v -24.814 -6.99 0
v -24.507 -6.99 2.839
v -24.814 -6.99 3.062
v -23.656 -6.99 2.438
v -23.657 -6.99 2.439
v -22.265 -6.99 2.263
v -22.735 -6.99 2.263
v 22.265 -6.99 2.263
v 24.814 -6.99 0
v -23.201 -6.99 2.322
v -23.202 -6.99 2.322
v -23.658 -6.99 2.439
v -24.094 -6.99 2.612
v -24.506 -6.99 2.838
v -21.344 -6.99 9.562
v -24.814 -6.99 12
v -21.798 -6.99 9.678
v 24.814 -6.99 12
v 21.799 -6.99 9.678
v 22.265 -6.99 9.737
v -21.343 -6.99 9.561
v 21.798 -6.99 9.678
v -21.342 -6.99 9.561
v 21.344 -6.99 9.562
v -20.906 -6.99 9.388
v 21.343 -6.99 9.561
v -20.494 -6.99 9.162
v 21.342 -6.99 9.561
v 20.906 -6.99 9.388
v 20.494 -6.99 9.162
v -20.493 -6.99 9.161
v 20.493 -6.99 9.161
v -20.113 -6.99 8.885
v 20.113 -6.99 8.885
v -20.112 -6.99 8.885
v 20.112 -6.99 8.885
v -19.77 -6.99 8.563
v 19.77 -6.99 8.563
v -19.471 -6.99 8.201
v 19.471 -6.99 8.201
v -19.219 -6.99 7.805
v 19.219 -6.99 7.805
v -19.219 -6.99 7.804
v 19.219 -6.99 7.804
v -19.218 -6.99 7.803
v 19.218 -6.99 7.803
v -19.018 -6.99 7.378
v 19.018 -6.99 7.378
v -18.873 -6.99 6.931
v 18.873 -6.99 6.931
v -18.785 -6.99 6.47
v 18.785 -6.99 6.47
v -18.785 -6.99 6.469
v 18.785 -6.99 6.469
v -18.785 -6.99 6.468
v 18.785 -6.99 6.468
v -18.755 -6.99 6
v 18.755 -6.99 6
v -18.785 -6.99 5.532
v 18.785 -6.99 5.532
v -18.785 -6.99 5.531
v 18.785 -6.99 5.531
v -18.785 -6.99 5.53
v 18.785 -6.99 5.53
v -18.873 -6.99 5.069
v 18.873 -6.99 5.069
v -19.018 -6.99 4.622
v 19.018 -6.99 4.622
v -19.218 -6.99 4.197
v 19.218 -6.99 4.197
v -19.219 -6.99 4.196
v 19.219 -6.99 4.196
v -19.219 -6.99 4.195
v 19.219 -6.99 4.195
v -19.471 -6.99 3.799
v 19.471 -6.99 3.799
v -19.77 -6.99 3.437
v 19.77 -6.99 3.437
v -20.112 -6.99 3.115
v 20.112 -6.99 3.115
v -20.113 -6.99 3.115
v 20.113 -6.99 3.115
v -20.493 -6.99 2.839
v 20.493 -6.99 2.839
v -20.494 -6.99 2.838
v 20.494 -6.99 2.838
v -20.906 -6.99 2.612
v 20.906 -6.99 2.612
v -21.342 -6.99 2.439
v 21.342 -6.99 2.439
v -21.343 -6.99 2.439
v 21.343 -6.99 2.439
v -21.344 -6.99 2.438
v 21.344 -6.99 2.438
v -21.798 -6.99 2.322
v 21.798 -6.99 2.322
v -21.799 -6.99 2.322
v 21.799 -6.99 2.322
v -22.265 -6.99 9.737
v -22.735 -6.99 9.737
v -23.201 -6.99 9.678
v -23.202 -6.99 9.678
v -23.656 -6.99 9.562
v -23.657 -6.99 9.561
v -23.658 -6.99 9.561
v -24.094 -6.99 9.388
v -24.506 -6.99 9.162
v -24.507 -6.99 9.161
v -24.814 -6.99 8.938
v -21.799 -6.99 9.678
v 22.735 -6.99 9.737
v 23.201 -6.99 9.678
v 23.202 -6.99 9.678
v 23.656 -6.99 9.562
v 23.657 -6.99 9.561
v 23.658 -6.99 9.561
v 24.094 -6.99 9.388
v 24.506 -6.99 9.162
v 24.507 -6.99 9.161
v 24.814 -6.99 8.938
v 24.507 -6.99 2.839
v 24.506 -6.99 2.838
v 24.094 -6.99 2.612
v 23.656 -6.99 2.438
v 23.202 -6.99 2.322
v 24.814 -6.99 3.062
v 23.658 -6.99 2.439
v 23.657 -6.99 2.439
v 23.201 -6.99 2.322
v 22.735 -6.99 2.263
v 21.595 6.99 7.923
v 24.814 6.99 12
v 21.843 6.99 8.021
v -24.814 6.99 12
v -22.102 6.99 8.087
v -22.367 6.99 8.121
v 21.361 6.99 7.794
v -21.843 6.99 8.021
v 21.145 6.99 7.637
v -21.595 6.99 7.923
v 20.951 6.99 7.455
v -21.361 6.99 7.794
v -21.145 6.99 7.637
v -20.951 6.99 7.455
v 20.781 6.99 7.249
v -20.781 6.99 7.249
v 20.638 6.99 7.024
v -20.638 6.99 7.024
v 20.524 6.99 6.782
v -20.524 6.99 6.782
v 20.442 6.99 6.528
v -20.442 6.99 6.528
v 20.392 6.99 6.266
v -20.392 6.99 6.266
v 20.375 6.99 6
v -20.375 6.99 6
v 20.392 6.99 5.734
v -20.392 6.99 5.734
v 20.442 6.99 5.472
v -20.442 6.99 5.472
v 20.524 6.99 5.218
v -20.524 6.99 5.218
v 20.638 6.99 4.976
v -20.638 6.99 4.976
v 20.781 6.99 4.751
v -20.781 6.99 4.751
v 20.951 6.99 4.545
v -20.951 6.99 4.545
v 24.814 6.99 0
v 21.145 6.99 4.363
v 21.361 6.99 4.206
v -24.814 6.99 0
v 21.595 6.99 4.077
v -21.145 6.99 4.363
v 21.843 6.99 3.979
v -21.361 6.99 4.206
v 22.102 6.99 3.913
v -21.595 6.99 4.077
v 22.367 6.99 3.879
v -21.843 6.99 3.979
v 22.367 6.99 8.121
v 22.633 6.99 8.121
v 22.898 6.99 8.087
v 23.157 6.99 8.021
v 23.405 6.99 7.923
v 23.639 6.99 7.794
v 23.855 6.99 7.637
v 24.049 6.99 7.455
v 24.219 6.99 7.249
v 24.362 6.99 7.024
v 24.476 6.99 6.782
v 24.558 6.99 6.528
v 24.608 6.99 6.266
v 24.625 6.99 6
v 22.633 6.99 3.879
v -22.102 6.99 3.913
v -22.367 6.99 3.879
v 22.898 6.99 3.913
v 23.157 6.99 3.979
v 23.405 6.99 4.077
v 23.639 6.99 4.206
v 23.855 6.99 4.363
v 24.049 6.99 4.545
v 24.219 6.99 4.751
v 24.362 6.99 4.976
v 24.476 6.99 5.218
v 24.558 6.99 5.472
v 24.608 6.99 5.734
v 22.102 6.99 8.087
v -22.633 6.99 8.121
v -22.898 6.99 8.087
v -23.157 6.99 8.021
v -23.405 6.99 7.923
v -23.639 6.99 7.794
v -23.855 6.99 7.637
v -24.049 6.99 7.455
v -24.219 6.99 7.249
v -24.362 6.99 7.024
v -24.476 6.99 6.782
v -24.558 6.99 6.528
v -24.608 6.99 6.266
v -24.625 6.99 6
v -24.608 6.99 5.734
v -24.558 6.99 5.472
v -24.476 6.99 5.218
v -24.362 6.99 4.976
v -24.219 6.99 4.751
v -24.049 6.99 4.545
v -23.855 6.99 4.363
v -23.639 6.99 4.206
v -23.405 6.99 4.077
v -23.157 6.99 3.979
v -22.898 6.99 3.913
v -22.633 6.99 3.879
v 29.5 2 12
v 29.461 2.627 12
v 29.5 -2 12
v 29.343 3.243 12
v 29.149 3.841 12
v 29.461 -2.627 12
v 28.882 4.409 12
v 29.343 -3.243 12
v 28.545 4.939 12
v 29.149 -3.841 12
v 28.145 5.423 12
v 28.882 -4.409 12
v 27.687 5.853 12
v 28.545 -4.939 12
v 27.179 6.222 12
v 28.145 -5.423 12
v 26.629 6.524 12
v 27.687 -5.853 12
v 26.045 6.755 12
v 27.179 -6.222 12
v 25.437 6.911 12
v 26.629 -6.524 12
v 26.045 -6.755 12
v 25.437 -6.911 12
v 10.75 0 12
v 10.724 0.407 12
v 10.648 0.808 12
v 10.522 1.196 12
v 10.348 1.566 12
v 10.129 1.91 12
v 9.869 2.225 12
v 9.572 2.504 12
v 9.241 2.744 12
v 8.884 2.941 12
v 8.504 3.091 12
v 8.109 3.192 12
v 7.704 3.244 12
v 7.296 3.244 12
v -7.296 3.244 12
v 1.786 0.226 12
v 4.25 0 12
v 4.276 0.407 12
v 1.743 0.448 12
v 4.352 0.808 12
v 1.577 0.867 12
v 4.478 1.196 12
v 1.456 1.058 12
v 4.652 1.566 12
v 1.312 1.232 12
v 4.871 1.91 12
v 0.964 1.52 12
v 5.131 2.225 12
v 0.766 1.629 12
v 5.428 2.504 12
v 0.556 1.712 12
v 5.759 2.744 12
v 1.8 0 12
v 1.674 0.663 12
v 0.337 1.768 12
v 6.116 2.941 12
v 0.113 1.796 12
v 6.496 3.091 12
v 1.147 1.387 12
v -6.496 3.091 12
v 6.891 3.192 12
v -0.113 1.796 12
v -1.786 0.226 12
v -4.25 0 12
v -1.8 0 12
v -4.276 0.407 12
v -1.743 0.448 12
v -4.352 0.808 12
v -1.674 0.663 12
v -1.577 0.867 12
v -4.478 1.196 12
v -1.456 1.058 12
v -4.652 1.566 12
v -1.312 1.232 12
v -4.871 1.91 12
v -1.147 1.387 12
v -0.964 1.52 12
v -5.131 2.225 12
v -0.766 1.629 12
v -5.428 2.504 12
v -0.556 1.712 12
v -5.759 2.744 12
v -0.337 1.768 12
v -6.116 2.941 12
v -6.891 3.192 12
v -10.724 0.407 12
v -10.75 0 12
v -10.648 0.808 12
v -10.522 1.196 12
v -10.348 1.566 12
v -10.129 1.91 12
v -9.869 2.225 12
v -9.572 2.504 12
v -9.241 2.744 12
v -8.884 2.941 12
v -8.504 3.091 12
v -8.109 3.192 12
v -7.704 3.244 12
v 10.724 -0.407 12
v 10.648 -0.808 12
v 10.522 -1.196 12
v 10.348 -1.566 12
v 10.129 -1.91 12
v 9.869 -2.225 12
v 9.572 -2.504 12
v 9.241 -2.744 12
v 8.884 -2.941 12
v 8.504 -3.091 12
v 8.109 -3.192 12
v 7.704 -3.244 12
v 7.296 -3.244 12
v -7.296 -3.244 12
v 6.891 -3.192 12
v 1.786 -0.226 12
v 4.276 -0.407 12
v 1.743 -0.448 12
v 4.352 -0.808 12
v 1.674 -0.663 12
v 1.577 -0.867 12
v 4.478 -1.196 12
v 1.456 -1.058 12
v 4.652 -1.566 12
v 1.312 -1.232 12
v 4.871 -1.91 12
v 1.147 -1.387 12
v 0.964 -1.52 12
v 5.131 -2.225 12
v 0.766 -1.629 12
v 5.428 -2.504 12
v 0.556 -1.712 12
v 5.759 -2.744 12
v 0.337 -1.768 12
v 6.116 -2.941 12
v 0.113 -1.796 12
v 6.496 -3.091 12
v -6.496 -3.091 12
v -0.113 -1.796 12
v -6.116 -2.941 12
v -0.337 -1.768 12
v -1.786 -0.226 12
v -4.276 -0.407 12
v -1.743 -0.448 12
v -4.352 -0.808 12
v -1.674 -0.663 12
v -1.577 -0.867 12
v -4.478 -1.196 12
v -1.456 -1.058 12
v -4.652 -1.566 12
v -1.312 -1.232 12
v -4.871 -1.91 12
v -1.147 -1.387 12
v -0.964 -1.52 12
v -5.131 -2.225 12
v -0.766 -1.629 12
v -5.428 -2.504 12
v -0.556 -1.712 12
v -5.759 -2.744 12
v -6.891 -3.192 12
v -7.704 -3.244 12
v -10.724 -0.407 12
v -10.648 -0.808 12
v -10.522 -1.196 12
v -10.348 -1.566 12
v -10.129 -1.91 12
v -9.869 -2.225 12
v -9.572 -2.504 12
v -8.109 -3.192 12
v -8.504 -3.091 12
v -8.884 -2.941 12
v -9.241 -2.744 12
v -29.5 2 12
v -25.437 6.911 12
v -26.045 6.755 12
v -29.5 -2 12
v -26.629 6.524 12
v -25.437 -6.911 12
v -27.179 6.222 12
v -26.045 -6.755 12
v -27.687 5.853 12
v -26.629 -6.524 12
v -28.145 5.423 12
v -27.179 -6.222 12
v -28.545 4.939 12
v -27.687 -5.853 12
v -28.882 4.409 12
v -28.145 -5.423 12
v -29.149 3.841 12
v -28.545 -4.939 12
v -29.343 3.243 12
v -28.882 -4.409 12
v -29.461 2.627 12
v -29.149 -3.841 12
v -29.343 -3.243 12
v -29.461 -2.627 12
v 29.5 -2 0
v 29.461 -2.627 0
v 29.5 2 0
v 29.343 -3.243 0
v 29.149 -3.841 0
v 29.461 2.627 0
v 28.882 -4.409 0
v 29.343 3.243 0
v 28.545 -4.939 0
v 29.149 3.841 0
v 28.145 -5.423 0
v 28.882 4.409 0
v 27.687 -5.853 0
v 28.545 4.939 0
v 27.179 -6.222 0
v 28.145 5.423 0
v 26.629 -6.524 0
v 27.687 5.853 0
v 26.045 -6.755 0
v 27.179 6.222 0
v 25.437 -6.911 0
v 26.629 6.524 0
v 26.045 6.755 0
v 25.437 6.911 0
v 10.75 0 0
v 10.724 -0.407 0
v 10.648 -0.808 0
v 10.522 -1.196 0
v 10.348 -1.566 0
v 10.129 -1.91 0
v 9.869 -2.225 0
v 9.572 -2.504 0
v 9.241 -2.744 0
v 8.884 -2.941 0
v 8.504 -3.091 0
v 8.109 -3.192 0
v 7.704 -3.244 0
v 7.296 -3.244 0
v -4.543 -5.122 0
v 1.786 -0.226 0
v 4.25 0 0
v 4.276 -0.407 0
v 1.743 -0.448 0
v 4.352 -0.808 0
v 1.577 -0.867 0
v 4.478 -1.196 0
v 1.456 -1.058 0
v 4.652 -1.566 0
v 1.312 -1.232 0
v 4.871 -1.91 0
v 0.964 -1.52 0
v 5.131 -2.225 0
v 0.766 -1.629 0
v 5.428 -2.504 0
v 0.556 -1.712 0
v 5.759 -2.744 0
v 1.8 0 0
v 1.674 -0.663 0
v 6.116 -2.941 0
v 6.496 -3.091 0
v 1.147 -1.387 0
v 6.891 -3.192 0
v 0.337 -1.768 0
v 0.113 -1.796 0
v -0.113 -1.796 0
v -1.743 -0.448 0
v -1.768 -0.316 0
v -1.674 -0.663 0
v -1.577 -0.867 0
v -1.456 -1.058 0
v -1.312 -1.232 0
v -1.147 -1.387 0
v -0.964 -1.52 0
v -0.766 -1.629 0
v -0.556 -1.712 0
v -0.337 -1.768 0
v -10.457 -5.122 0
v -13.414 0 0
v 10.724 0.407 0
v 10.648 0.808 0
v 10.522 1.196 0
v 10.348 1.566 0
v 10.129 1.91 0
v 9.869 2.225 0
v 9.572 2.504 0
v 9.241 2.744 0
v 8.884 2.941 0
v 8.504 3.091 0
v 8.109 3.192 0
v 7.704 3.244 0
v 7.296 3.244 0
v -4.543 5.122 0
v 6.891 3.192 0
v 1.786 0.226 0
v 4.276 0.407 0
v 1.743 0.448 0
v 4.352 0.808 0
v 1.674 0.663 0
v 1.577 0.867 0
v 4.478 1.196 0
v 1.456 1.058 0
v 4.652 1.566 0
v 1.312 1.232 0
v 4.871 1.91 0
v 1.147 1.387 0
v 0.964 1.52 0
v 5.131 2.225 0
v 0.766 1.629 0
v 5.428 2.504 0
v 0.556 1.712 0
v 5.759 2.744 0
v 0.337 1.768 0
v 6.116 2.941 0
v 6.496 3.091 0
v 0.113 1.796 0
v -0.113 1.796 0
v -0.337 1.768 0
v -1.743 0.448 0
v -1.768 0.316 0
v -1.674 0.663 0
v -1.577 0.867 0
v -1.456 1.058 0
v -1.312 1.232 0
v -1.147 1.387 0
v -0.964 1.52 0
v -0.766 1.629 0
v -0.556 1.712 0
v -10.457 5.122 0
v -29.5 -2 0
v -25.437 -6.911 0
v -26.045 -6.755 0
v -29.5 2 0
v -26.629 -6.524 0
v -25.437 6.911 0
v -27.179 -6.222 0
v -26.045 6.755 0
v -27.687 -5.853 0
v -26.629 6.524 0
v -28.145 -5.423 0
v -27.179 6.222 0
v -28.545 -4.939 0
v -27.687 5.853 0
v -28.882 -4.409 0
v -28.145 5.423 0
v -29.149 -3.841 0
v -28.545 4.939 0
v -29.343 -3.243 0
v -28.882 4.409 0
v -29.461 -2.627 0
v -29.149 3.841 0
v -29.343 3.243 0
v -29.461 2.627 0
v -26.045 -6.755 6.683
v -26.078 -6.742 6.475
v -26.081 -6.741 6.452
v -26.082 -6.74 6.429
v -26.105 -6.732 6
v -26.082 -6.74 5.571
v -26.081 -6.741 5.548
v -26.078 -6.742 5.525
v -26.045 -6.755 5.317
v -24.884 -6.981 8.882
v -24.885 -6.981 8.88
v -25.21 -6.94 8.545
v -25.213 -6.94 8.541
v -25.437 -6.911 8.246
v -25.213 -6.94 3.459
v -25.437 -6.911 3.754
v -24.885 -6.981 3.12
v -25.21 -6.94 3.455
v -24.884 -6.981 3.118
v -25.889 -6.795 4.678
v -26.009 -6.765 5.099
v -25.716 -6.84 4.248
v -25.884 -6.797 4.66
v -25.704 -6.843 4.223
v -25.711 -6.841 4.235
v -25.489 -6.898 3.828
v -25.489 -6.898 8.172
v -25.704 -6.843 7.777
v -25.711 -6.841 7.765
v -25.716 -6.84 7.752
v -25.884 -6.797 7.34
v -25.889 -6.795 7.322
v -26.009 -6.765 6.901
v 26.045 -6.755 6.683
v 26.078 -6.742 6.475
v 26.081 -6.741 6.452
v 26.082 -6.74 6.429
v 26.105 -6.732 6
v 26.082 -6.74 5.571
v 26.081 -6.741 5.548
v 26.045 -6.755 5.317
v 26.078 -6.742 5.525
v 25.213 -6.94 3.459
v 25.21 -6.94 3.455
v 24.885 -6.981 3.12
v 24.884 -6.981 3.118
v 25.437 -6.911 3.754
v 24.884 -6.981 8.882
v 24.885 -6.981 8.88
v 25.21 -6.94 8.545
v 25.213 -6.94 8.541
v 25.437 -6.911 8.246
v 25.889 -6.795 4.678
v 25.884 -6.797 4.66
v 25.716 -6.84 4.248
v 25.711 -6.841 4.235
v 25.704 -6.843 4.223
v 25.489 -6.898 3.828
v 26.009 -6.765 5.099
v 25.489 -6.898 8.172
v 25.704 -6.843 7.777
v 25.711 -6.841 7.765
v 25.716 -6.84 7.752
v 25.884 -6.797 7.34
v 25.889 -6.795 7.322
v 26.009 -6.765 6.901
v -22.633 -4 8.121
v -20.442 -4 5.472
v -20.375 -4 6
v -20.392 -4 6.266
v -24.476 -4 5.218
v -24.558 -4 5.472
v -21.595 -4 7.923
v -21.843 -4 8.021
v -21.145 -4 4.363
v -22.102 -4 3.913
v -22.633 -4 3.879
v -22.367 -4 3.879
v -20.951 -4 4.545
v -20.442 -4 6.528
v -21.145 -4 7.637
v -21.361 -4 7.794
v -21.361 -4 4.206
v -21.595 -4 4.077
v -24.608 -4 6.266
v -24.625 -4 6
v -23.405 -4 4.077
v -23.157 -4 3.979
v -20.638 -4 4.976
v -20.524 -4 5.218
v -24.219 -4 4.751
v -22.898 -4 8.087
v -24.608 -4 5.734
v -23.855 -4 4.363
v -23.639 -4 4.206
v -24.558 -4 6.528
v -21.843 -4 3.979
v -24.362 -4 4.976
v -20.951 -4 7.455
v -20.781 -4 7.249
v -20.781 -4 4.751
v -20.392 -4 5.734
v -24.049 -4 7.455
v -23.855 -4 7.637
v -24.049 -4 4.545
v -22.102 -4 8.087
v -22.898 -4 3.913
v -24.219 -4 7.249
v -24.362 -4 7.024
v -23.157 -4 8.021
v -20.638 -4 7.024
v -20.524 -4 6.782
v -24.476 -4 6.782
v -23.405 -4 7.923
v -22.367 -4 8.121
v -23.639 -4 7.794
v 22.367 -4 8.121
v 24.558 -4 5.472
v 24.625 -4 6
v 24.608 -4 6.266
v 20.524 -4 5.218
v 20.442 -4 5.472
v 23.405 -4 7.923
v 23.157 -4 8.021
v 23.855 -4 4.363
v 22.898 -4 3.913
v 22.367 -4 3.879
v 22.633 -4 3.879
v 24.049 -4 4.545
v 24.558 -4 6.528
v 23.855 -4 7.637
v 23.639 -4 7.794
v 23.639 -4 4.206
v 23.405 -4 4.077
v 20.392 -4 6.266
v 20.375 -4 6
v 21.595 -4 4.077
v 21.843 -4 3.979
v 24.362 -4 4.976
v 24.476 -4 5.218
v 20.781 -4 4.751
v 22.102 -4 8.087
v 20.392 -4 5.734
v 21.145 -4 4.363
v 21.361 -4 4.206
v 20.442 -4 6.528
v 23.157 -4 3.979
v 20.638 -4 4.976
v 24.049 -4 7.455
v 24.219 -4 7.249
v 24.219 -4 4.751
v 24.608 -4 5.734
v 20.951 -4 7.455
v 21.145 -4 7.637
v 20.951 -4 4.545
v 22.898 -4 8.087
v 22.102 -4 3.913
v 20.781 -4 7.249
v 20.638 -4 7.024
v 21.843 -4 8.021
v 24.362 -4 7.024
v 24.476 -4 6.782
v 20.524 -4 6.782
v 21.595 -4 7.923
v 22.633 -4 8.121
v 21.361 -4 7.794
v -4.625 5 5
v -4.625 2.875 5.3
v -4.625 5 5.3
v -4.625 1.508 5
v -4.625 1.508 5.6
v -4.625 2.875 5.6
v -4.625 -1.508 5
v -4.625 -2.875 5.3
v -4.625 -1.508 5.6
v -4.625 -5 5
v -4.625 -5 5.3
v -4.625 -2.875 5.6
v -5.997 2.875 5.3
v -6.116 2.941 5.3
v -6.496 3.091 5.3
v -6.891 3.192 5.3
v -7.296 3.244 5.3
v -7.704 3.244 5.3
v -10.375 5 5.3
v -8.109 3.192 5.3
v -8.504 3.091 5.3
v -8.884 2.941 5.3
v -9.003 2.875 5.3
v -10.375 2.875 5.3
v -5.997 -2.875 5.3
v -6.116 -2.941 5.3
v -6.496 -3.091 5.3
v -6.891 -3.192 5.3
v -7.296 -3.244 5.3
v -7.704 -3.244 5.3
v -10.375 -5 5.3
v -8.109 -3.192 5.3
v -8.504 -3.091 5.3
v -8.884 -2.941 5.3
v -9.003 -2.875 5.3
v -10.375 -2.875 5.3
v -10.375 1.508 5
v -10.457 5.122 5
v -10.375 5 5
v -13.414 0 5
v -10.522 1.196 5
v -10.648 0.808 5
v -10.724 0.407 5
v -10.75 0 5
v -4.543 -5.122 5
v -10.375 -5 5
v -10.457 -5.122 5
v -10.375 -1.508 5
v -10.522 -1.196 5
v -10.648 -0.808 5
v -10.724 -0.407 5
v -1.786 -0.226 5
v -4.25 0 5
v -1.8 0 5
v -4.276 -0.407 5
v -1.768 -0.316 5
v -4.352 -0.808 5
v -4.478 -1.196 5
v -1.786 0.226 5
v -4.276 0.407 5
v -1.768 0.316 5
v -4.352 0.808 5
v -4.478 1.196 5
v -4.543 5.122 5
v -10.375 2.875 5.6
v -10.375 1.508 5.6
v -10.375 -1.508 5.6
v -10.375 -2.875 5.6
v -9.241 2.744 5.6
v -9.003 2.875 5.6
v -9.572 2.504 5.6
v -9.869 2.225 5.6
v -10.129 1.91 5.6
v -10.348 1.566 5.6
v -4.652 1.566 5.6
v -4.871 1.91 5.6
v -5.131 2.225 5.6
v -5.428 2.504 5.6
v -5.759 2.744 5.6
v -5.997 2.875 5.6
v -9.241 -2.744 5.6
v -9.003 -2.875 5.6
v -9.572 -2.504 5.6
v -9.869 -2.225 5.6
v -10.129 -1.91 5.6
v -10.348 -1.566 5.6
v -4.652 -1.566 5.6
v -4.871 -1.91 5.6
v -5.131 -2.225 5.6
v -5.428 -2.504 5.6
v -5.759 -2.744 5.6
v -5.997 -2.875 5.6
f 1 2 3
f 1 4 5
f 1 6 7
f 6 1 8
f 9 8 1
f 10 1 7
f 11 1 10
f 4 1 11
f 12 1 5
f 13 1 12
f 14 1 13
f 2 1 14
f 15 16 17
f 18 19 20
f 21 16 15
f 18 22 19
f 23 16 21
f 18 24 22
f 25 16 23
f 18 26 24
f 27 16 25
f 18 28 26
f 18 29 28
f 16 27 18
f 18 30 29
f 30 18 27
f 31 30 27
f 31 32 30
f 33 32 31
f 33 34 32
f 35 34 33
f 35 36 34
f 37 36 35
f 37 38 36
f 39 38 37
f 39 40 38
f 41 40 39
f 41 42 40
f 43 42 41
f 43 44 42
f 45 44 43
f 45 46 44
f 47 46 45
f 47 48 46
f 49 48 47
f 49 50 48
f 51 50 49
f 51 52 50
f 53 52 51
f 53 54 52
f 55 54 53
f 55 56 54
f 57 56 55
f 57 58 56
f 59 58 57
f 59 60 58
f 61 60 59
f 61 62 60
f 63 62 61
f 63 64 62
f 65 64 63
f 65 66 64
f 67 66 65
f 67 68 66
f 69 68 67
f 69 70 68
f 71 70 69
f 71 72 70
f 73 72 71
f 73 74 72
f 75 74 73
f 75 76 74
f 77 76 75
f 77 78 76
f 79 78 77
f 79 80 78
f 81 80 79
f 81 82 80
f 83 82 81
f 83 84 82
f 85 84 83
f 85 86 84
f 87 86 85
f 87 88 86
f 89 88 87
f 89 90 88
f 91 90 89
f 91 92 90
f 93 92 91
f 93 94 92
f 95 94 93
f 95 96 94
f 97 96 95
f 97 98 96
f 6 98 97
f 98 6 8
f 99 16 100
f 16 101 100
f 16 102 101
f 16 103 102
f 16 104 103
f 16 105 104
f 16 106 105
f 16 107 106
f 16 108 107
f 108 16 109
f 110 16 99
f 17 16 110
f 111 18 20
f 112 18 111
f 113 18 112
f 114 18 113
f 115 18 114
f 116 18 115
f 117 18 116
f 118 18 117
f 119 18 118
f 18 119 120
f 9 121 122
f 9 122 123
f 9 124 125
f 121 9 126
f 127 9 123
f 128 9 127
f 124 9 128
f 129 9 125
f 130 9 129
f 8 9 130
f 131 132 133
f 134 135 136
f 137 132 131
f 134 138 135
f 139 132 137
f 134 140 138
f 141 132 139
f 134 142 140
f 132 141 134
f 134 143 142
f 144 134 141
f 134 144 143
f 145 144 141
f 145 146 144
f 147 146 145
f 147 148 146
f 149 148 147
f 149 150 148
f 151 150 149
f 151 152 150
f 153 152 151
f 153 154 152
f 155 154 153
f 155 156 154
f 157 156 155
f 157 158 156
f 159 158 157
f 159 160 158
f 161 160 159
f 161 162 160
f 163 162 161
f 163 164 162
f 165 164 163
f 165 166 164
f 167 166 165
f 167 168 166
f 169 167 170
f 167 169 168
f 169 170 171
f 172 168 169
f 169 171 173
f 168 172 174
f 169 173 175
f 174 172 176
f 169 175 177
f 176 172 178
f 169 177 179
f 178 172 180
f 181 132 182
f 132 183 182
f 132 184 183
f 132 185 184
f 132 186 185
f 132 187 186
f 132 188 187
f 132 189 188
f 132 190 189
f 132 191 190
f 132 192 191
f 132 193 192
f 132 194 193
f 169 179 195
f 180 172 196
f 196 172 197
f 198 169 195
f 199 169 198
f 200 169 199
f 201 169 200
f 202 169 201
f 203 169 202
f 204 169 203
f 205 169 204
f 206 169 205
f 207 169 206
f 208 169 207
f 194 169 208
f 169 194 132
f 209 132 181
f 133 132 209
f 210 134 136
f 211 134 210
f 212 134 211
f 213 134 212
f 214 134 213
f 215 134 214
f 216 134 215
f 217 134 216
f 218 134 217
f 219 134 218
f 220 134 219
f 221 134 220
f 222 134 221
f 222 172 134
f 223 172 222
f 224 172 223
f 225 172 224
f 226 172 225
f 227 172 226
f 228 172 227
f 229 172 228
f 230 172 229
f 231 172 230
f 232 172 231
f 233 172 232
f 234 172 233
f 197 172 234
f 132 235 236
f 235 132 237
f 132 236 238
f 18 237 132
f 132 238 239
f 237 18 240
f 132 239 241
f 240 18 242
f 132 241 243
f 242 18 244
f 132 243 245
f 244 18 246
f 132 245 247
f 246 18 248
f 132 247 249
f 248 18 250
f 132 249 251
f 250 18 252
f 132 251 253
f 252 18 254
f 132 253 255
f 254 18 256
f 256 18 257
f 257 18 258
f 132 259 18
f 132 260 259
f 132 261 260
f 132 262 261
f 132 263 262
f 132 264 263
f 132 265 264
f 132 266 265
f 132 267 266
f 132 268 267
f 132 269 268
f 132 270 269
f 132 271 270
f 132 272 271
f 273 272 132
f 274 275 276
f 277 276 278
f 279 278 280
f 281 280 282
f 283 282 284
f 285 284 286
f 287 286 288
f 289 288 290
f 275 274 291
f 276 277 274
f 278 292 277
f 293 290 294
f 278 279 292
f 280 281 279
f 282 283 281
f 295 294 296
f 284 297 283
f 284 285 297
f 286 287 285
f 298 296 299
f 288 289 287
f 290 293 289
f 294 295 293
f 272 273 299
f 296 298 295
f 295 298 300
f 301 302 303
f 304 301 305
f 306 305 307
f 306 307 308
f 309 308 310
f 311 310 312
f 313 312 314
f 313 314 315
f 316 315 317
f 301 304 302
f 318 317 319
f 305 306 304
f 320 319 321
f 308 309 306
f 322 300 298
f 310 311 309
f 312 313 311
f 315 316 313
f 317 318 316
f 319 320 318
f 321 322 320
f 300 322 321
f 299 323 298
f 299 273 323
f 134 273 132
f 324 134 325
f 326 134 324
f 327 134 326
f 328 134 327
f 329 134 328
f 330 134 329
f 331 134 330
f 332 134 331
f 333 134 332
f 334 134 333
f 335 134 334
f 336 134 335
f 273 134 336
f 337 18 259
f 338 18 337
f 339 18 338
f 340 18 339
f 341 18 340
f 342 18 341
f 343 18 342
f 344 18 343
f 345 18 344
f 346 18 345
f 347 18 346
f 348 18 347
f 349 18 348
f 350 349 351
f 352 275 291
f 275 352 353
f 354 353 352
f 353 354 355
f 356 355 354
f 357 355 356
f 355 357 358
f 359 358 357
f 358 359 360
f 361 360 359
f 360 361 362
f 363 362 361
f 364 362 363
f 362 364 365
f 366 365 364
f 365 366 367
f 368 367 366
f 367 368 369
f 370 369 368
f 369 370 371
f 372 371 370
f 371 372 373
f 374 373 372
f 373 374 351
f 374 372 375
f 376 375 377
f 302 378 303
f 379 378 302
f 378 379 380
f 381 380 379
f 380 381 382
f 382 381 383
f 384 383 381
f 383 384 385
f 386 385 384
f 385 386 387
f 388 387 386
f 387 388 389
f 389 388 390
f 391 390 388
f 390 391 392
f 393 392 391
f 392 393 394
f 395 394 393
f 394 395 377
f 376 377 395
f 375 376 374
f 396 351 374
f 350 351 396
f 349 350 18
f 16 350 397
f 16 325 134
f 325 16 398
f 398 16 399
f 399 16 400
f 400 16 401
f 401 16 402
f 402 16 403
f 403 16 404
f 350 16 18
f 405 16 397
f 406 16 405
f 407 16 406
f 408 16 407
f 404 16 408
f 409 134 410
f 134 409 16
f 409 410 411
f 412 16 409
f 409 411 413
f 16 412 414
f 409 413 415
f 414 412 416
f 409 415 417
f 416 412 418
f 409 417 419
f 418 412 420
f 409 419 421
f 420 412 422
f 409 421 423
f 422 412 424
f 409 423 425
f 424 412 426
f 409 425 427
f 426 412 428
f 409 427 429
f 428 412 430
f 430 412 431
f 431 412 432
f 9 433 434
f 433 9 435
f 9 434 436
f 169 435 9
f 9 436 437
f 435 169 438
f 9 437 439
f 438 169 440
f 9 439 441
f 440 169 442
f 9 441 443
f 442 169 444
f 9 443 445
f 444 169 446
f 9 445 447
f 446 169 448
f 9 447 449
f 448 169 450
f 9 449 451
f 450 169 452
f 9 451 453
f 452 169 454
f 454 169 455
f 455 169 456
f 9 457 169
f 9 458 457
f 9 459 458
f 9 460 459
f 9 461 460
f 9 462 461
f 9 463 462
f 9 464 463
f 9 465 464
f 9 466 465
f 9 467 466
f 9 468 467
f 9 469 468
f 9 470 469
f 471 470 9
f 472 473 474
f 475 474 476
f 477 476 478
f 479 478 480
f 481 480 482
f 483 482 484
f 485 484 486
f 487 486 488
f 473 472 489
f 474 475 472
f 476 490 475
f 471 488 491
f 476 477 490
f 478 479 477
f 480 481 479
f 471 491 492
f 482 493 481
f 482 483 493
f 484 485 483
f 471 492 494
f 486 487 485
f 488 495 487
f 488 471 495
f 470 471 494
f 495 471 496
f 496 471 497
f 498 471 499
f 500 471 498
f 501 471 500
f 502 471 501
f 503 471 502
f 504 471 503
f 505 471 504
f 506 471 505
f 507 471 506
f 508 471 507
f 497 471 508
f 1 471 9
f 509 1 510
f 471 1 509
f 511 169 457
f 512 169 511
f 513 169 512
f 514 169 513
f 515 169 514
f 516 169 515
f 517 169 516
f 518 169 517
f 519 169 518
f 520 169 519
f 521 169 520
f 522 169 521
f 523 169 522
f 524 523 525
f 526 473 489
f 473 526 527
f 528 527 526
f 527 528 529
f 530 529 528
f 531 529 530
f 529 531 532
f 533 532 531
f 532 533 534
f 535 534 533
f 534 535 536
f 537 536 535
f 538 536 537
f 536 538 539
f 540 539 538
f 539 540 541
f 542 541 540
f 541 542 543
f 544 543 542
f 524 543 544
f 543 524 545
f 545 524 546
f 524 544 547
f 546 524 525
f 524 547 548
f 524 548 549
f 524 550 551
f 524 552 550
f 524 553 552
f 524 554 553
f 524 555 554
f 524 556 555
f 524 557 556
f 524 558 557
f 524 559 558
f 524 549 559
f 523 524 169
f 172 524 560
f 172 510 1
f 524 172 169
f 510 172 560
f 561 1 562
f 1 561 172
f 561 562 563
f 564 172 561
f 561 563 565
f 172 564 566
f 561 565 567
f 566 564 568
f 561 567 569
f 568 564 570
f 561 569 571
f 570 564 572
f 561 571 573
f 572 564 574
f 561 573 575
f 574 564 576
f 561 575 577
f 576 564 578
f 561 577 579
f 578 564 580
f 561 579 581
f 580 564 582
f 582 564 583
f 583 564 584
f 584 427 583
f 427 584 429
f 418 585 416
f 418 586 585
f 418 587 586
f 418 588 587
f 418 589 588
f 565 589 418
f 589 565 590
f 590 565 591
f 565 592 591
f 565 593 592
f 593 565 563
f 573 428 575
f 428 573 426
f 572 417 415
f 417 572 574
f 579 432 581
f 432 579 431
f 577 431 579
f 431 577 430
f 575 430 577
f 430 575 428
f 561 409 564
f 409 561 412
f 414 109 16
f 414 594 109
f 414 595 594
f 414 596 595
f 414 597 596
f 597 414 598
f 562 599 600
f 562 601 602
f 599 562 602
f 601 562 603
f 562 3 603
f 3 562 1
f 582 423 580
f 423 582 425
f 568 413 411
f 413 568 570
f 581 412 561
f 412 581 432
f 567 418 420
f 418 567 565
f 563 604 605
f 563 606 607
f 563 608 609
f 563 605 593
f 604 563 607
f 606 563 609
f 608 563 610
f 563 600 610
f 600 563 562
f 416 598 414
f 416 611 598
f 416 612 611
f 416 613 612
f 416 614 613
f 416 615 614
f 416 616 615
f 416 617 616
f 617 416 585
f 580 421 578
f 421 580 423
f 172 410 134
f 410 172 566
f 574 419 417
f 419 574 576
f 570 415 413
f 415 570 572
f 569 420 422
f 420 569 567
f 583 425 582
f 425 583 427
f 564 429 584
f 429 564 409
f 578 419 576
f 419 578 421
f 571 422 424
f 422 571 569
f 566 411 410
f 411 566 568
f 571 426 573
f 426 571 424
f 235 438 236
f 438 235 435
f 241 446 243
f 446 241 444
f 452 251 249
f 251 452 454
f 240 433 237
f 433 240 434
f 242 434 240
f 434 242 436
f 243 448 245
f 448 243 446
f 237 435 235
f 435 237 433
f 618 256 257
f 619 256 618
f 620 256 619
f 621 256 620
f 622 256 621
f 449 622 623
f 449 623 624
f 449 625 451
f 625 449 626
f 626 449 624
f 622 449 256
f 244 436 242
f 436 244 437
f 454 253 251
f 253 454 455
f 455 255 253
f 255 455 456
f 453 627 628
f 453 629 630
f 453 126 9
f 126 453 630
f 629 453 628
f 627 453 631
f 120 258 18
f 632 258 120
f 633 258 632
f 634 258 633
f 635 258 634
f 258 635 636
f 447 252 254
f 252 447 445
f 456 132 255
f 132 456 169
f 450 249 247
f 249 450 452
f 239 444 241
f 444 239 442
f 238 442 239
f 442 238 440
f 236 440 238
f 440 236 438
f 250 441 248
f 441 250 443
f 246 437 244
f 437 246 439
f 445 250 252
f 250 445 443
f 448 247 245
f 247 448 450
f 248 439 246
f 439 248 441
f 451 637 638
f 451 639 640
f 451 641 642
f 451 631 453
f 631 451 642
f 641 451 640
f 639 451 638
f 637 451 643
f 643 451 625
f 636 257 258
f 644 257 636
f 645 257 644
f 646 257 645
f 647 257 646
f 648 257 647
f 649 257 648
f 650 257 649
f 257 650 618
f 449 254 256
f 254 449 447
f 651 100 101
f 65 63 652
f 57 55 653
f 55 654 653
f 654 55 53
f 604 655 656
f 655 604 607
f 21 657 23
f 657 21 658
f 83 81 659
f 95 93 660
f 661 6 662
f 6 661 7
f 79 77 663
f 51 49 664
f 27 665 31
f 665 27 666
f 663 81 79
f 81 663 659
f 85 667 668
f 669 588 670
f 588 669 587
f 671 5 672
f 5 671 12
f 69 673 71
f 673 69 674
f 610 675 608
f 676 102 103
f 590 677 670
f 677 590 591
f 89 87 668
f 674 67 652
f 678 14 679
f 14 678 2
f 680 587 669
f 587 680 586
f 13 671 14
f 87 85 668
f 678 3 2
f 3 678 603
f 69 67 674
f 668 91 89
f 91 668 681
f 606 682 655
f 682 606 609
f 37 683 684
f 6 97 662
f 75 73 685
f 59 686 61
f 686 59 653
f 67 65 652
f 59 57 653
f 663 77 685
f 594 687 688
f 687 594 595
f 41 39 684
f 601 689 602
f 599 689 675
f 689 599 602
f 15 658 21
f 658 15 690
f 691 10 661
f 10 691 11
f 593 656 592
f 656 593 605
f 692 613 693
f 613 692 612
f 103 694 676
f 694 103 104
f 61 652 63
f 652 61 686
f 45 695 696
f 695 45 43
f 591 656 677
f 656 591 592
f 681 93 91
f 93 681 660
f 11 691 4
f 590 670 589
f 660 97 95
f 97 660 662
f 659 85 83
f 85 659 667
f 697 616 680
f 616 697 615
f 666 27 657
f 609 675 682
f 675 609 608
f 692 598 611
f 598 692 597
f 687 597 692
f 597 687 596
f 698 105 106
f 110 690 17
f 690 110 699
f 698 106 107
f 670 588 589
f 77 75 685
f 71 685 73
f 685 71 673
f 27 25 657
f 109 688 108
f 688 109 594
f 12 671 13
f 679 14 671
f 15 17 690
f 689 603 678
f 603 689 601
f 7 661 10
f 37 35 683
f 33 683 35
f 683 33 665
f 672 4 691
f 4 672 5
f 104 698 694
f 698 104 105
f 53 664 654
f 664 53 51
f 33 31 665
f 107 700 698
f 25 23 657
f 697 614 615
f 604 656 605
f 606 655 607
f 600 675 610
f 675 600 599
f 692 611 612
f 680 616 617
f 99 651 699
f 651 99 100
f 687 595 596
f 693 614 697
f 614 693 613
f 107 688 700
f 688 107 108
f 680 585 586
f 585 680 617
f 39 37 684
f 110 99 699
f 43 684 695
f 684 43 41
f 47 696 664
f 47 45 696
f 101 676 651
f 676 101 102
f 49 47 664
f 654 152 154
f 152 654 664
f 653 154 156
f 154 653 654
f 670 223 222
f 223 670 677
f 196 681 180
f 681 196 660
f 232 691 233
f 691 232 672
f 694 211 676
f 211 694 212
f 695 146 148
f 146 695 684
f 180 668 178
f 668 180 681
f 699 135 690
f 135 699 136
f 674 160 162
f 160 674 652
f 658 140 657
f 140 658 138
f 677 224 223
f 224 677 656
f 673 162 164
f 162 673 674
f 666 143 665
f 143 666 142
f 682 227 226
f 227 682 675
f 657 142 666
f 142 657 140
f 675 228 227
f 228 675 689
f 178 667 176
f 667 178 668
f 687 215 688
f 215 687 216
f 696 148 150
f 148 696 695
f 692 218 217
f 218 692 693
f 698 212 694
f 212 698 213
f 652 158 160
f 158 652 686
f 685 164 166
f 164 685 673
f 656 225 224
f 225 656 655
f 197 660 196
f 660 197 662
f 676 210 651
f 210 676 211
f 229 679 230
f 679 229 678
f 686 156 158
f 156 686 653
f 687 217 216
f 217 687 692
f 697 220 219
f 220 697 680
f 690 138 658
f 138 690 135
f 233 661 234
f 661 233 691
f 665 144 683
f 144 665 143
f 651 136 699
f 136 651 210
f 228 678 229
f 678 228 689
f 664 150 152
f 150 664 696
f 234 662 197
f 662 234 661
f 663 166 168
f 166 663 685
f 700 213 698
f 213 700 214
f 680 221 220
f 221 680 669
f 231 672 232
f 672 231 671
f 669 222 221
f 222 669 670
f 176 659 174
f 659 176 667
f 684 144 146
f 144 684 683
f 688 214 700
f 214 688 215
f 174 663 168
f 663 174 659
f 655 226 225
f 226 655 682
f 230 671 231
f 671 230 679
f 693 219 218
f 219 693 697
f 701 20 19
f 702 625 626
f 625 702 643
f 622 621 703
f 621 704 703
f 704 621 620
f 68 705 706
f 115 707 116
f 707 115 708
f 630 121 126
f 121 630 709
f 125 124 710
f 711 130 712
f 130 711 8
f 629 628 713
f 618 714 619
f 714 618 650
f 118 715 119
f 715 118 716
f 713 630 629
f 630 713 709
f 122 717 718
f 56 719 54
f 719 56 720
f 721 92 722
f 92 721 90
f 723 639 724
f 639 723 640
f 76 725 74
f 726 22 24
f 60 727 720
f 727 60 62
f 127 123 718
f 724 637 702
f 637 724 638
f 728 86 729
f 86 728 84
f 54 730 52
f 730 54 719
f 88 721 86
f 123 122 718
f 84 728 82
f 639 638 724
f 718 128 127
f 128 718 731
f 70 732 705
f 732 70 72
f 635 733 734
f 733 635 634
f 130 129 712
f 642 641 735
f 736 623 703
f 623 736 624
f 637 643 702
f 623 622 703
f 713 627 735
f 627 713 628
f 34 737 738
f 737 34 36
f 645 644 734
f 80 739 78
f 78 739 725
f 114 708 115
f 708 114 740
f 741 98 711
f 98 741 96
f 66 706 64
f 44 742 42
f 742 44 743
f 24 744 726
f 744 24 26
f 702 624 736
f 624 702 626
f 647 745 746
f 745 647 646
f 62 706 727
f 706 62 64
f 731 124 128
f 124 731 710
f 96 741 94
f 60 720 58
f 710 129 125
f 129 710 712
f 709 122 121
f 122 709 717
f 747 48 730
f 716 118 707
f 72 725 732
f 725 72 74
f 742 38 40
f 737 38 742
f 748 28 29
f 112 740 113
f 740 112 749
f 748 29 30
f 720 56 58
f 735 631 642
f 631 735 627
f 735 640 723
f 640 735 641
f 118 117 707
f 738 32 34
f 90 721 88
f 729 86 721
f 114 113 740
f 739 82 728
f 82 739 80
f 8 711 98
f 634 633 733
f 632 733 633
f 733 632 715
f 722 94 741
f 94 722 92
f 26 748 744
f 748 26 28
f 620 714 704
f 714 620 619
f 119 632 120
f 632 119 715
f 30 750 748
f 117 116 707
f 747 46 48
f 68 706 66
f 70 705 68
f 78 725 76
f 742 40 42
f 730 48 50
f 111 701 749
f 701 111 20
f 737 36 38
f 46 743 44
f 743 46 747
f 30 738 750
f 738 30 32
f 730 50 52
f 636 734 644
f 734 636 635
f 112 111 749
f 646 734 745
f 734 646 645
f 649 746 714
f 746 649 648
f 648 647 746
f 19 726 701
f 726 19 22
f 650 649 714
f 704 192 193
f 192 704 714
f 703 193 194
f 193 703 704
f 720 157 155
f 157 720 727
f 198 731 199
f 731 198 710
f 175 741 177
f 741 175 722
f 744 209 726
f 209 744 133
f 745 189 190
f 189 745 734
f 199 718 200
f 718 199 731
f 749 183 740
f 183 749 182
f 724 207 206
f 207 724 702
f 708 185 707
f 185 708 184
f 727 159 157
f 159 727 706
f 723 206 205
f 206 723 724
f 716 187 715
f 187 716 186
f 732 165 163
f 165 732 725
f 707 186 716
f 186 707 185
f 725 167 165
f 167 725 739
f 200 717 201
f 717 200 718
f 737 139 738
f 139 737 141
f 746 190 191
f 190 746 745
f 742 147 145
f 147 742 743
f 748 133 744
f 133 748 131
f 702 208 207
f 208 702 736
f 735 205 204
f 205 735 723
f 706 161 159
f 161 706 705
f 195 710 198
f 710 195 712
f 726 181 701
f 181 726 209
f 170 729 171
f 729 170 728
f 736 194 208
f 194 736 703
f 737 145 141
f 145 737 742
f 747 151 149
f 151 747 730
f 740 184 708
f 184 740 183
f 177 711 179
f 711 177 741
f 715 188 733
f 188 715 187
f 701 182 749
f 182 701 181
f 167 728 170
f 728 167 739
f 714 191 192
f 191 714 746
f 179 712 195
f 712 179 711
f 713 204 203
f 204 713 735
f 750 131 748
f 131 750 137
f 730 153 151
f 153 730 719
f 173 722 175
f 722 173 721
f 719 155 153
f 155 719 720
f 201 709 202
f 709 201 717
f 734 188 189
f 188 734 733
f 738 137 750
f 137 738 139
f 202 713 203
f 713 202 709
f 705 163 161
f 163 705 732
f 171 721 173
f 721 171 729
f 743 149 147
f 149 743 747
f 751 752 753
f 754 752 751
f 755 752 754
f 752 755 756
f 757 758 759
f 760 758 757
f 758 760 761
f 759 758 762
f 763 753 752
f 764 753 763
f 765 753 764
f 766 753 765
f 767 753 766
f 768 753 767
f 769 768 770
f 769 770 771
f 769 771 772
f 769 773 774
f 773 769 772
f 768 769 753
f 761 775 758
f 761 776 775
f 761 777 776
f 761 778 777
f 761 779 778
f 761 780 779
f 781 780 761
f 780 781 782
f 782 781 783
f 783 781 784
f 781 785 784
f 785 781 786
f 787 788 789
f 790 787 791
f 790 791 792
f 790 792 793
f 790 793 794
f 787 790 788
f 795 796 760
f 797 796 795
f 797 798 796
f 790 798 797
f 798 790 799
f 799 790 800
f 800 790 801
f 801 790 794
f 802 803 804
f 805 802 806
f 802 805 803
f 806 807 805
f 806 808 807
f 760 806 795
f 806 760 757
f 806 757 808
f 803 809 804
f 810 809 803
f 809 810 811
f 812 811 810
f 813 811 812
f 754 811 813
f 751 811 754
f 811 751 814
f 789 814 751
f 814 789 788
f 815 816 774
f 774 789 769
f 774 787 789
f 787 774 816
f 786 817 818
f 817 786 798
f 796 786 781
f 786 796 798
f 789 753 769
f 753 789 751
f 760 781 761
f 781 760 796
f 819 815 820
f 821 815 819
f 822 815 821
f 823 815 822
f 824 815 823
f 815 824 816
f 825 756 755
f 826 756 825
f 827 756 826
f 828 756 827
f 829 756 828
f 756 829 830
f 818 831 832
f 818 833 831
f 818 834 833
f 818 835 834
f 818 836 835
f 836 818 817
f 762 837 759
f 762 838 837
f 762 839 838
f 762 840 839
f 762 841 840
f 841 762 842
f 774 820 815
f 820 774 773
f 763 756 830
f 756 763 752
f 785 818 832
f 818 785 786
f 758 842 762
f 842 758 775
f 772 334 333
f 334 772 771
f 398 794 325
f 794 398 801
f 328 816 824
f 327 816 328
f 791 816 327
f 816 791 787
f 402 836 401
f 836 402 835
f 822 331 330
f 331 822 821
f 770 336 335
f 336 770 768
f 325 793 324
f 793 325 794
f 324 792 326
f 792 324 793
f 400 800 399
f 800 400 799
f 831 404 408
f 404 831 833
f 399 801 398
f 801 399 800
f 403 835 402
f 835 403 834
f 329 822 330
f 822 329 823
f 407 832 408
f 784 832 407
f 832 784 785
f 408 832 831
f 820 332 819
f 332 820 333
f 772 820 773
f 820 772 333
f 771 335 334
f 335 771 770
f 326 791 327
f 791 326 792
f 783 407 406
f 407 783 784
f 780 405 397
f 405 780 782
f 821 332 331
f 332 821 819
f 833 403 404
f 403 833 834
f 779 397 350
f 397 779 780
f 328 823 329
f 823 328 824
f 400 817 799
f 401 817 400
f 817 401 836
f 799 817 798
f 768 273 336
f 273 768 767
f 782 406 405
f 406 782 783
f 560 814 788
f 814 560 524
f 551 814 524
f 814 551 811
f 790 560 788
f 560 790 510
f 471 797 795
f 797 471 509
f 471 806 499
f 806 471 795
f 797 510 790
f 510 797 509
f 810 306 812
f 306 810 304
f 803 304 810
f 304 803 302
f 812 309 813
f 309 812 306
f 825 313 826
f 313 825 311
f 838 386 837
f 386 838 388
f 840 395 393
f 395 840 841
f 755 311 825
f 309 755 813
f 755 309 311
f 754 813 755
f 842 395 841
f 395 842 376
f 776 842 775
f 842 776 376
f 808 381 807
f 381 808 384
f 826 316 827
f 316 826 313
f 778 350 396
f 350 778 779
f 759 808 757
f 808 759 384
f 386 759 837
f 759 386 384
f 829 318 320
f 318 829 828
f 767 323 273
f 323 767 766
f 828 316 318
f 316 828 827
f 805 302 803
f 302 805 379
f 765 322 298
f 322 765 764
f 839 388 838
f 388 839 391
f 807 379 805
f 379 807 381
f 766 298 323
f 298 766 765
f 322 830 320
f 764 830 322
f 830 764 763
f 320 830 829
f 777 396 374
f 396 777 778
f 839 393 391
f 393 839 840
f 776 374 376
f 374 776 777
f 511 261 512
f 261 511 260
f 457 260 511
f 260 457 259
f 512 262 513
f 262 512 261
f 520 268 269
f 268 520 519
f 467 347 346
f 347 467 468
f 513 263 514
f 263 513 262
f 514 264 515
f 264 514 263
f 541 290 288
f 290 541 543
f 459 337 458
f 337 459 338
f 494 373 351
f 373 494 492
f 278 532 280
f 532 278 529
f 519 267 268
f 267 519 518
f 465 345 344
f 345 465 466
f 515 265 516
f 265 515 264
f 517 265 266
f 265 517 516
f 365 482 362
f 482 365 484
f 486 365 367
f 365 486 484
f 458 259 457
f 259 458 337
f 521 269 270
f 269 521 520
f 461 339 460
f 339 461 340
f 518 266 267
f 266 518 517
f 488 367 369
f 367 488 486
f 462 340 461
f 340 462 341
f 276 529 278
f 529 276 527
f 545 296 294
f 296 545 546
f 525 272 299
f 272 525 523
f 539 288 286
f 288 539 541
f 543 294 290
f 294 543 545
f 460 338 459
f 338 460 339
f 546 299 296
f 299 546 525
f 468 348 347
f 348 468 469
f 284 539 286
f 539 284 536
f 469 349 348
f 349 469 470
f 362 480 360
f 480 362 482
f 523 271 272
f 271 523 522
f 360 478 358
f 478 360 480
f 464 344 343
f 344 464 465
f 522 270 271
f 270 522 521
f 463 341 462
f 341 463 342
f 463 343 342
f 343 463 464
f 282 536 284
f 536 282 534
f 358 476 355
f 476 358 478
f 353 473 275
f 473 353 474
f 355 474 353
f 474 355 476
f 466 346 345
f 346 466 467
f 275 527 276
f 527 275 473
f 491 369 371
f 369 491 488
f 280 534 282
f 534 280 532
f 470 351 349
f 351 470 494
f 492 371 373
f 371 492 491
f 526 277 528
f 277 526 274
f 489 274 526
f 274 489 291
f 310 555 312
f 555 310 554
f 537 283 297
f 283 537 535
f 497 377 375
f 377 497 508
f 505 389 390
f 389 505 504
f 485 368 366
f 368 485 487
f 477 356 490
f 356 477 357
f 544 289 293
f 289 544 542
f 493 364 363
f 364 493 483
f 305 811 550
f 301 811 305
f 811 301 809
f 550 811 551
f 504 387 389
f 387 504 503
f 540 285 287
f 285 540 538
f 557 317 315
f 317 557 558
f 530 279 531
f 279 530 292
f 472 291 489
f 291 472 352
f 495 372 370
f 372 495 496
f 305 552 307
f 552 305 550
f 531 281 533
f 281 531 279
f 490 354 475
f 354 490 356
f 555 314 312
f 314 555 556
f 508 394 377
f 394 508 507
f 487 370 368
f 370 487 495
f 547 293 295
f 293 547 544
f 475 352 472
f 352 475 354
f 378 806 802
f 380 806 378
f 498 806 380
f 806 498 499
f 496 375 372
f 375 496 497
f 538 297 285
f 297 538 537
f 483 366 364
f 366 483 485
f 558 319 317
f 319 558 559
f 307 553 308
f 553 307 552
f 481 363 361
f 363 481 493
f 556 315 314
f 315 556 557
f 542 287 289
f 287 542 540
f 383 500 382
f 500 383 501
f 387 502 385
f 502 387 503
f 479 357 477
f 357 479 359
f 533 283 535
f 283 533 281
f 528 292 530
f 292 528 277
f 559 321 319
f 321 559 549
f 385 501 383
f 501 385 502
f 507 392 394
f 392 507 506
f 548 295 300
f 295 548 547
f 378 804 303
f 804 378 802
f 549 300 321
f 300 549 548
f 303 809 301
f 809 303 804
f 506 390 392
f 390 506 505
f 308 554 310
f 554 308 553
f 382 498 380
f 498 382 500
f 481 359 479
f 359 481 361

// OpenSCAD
$fn = 50;


difference() {
	union() {
		hull() {
			translate(v = [-9.5000000000, 2.0000000000, 0]) {
				cylinder(h = 12, r = 5);
			}
			translate(v = [9.5000000000, 2.0000000000, 0]) {
				cylinder(h = 12, r = 5);
			}
			translate(v = [-9.5000000000, -2.0000000000, 0]) {
				cylinder(h = 12, r = 5);
			}
			translate(v = [9.5000000000, -2.0000000000, 0]) {
				cylinder(h = 12, r = 5);
			}
		}
		translate(v = [-15.0000000000, 0.0000000000, 0]) {
			hull() {
				translate(v = [-9.5000000000, 2.0000000000, 0]) {
					cylinder(h = 12, r = 5);
				}
				translate(v = [9.5000000000, 2.0000000000, 0]) {
					cylinder(h = 12, r = 5);
				}
				translate(v = [-9.5000000000, -2.0000000000, 0]) {
					cylinder(h = 12, r = 5);
				}
				translate(v = [9.5000000000, -2.0000000000, 0]) {
					cylinder(h = 12, r = 5);
				}
			}
		}
		translate(v = [-15.0000000000, 0.0000000000, 0]) {
			hull() {
				translate(v = [-9.5000000000, 2.0000000000, 0]) {
					cylinder(h = 12, r = 5);
				}
				translate(v = [9.5000000000, 2.0000000000, 0]) {
					cylinder(h = 12, r = 5);
				}
				translate(v = [-9.5000000000, -2.0000000000, 0]) {
					cylinder(h = 12, r = 5);
				}
				translate(v = [9.5000000000, -2.0000000000, 0]) {
					cylinder(h = 12, r = 5);
				}
			}
		}
		translate(v = [15.0000000000, 0.0000000000, 0]) {
			hull() {
				translate(v = [-9.5000000000, 2.0000000000, 0]) {
					cylinder(h = 12, r = 5);
				}
				translate(v = [9.5000000000, 2.0000000000, 0]) {
					cylinder(h = 12, r = 5);
				}
				translate(v = [-9.5000000000, -2.0000000000, 0]) {
					cylinder(h = 12, r = 5);
				}
				translate(v = [9.5000000000, -2.0000000000, 0]) {
					cylinder(h = 12, r = 5);
				}
			}
		}
		translate(v = [15.0000000000, 0.0000000000, 0]) {
			hull() {
				translate(v = [-9.5000000000, 2.0000000000, 0]) {
					cylinder(h = 12, r = 5);
				}
				translate(v = [9.5000000000, 2.0000000000, 0]) {
					cylinder(h = 12, r = 5);
				}
				translate(v = [-9.5000000000, -2.0000000000, 0]) {
					cylinder(h = 12, r = 5);
				}
				translate(v = [9.5000000000, -2.0000000000, 0]) {
					cylinder(h = 12, r = 5);
				}
			}
		}
	}
	union() {
		translate(v = [-22.5000000000, -7.0000000000, 6.0000000000]) {
			rotate(a = [90, 0, 0]) {
				difference() {
					union() {
						#translate(v = [0, 0, -14.0000000000]) {
							cylinder(h = 14, r = 2.0000000000);
						}
						#translate(v = [0, 0, -3]) {
							cylinder(h = 3, r1 = 2.1250000000, r2 = 3.7500000000);
						}
						#translate(v = [0, 0, -14.0000000000]) {
							cylinder(h = 14, r = 2.1250000000);
						}
						#translate(v = [0, 0, -14.0000000000]) {
							cylinder(h = 14, r = 2.0000000000);
						}
					}
					union();
				}
			}
		}
		translate(v = [22.5000000000, -7.0000000000, 6.0000000000]) {
			rotate(a = [90, 0, 0]) {
				difference() {
					union() {
						#translate(v = [0, 0, -14.0000000000]) {
							cylinder(h = 14, r = 2.0000000000);
						}
						#translate(v = [0, 0, -3]) {
							cylinder(h = 3, r1 = 2.1250000000, r2 = 3.7500000000);
						}
						#translate(v = [0, 0, -14.0000000000]) {
							cylinder(h = 14, r = 2.1250000000);
						}
						#translate(v = [0, 0, -14.0000000000]) {
							cylinder(h = 14, r = 2.0000000000);
						}
					}
					union();
				}
			}
		}
		translate(v = [-7.5000000000, 0.0000000000, 0]) {
			rotate(a = [0, 0, 0]) {
				difference() {
					union() {
						#translate(v = [-2.8750000000, -5.0000000000, -0.3000000000]) {
							cube(size = [5.7500000000, 10, 0.3000000000]);
						}
						#translate(v = [-2.8750000000, -2.8750000000, -0.6000000000]) {
							cube(size = [5.7500000000, 5.7500000000, 0.3000000000]);
						}
						#translate(v = [-2.8750000000, -5.0000000000, 5]) {
							cube(size = [5.7500000000, 10, 0.3000000000]);
						}
						#translate(v = [-2.8750000000, -2.8750000000, 5.3000000000]) {
							cube(size = [5.7500000000, 5.7500000000, 0.3000000000]);
						}
						#translate(v = [0, 0, -100.0000000000]) {
							cylinder(h = 200, r = 3.2500000000);
						}
						#linear_extrude(height = 5) {
							polygon(points = [[5.9142500000, 0.0000000000], [2.9571250000, 5.1218907443], [-2.9571250000, 5.1218907443], [-5.9142500000, 0.0000000000], [-2.9571250000, -5.1218907443], [2.9571250000, -5.1218907443]]);
						}
						#translate(v = [-2.8750000000, -5.0000000000, -0.3000000000]) {
							cube(size = [5.7500000000, 10, 0.3000000000]);
						}
						#translate(v = [-2.8750000000, -2.8750000000, -0.6000000000]) {
							cube(size = [5.7500000000, 5.7500000000, 0.3000000000]);
						}
						#translate(v = [-2.8750000000, -5.0000000000, 5]) {
							cube(size = [5.7500000000, 10, 0.3000000000]);
						}
						#translate(v = [-2.8750000000, -2.8750000000, 5.3000000000]) {
							cube(size = [5.7500000000, 5.7500000000, 0.3000000000]);
						}
						#translate(v = [0, 0, -100.0000000000]) {
							cylinder(h = 200, r = 3.2500000000);
						}
						#translate(v = [-2.8750000000, -5.0000000000, -0.3000000000]) {
							cube(size = [5.7500000000, 10, 0.3000000000]);
						}
						#translate(v = [-2.8750000000, -2.8750000000, -0.6000000000]) {
							cube(size = [5.7500000000, 5.7500000000, 0.3000000000]);
						}
						#translate(v = [-2.8750000000, -5.0000000000, 5]) {
							cube(size = [5.7500000000, 10, 0.3000000000]);
						}
						#translate(v = [-2.8750000000, -2.8750000000, 5.3000000000]) {
							cube(size = [5.7500000000, 5.7500000000, 0.3000000000]);
						}
						#translate(v = [0, 0, -100.0000000000]) {
							cylinder(h = 200, r = 3.2500000000);
						}
					}
					union();
				}
			}
		}
		translate(v = [-7.5000000000, 0.0000000000, 0]) {
			translate(v = [0, 0, -100]) {
				cylinder(h = 200, r = 3.2500000000);
			}
		}
		translate(v = [7.5000000000, 0.0000000000, 0]) {
			translate(v = [0, 0, -100]) {
				cylinder(h = 200, r = 3.2500000000);
			}
		}
		translate(v = [-7.5000000000, 0.0000000000, 0]) {
			translate(v = [0, 0, -100]) {
				cylinder(h = 200, r = 1.8000000000);
			}
		}
		translate(v = [0, 0, -100]) {
			cylinder(h = 200, r = 1.8000000000);
		}
		translate(v = [7.5000000000, 0.0000000000, 0]) {
			translate(v = [0, 0, -100]) {
				cylinder(h = 200, r = 1.8000000000);
			}
		}
	}
}
